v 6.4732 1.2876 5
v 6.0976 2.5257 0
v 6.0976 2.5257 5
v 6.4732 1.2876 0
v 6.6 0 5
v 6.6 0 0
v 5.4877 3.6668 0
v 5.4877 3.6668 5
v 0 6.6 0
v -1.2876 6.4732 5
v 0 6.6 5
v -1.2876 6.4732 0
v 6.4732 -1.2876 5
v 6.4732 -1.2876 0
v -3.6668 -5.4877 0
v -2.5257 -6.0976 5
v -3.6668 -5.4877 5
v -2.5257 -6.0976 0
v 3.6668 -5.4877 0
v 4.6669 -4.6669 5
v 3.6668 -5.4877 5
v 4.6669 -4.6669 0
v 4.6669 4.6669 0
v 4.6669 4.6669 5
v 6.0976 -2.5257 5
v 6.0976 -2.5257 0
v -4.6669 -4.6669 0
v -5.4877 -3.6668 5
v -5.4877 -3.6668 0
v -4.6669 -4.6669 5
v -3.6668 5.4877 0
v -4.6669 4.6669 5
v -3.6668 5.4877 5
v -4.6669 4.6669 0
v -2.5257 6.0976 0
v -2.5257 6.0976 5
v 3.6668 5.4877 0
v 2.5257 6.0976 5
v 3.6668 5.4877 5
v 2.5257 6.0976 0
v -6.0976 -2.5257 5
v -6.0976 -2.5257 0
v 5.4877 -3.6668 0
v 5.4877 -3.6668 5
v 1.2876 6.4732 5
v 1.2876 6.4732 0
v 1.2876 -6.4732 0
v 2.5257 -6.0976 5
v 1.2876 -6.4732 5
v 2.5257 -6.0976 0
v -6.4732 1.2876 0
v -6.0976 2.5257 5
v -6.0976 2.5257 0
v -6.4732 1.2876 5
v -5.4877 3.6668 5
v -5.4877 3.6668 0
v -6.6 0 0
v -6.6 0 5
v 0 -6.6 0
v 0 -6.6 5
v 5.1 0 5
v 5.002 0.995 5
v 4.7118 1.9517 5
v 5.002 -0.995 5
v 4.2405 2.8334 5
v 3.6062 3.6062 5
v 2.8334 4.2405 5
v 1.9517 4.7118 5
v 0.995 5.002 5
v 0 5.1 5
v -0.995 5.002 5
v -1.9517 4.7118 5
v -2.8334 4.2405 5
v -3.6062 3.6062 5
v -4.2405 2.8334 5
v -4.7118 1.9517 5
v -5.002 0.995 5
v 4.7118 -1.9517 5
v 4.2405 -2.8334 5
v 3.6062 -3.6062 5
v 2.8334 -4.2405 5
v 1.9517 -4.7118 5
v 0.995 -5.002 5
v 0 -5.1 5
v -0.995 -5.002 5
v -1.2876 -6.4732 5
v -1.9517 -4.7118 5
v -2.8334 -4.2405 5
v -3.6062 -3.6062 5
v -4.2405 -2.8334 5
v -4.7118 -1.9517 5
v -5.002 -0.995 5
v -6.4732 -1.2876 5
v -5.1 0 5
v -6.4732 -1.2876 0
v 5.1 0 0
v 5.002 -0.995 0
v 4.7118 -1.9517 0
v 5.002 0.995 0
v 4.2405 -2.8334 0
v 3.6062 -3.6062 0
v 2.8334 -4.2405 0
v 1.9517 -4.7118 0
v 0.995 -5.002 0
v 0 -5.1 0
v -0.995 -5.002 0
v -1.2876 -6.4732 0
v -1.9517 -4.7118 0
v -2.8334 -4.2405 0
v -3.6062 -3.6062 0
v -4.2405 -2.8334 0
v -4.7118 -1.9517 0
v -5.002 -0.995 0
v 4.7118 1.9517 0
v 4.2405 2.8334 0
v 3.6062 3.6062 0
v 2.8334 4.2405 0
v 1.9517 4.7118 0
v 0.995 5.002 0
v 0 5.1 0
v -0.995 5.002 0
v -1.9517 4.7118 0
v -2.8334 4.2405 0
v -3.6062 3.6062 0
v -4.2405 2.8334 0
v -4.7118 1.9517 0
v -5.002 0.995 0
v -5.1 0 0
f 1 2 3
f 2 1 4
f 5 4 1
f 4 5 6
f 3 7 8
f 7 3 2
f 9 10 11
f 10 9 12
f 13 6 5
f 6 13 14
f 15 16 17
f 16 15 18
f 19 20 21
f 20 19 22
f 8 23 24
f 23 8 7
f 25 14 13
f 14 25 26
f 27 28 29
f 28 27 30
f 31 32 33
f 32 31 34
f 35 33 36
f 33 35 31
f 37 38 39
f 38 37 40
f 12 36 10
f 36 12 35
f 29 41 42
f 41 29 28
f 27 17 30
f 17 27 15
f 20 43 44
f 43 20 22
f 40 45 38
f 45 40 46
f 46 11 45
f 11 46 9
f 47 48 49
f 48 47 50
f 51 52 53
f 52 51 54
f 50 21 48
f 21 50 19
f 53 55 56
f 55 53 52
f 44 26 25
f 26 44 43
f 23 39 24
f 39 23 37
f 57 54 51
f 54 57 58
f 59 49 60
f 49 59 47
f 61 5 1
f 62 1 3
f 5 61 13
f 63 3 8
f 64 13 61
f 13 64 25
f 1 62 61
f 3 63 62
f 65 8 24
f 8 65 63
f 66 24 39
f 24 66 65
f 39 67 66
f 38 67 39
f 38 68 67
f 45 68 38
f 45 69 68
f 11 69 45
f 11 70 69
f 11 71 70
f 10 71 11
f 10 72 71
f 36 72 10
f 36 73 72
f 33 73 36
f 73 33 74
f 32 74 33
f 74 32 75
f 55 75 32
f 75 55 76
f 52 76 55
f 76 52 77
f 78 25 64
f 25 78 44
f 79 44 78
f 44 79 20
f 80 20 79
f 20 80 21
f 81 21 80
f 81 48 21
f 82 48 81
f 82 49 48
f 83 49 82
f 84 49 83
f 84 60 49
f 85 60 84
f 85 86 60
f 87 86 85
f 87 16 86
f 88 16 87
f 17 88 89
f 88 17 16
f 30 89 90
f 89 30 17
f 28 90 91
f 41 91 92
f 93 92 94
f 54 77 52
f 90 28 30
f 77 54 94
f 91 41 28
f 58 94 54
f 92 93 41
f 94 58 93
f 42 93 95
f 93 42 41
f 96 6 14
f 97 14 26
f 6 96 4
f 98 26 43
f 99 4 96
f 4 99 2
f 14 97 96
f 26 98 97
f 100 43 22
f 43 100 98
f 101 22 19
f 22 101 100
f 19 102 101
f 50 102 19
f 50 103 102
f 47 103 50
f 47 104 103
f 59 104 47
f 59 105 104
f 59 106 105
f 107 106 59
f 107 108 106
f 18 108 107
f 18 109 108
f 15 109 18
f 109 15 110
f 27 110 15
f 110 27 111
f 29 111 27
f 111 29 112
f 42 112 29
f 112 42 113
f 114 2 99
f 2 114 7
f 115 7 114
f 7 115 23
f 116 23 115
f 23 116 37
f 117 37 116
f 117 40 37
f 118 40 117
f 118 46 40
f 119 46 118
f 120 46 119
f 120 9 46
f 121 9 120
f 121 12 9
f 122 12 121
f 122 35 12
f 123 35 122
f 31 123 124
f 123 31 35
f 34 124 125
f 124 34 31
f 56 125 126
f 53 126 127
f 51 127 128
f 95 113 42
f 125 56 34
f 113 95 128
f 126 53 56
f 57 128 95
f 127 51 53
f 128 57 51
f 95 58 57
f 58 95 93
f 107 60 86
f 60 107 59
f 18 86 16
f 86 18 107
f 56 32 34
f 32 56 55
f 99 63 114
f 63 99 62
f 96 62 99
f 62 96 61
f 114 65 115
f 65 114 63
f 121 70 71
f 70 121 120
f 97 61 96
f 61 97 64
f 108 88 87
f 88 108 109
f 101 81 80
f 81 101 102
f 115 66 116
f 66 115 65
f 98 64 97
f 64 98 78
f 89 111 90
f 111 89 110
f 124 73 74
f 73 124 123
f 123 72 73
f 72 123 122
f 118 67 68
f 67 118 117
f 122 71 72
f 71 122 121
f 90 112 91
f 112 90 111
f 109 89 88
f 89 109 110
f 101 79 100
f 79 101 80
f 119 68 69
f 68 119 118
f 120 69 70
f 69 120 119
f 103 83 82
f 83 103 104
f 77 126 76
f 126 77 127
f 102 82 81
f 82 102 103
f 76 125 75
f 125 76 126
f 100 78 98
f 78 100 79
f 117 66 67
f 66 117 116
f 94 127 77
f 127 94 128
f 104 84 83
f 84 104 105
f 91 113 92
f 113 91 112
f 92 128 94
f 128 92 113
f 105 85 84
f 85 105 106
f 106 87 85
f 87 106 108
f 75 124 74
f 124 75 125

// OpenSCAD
$fn = 32;

// ----------------------------------------------------------------------
// Spacer sleeve: 13.2 / 10.2 x 5 mm
// ----------------------------------------------------------------------

// --- parameters (mm) ---
sleeve_od = 13.2;         // outside diameter
sleeve_id = 10.2;         // shaft bore
sleeve_l = 5;             // sleeve length

module sleeve() {
  cylinder(h = sleeve_l, d = sleeve_od);
}

difference() {
  sleeve();
  translate([0, 0, -1]) cylinder(h = sleeve_l + 2, d = sleeve_id);
}
